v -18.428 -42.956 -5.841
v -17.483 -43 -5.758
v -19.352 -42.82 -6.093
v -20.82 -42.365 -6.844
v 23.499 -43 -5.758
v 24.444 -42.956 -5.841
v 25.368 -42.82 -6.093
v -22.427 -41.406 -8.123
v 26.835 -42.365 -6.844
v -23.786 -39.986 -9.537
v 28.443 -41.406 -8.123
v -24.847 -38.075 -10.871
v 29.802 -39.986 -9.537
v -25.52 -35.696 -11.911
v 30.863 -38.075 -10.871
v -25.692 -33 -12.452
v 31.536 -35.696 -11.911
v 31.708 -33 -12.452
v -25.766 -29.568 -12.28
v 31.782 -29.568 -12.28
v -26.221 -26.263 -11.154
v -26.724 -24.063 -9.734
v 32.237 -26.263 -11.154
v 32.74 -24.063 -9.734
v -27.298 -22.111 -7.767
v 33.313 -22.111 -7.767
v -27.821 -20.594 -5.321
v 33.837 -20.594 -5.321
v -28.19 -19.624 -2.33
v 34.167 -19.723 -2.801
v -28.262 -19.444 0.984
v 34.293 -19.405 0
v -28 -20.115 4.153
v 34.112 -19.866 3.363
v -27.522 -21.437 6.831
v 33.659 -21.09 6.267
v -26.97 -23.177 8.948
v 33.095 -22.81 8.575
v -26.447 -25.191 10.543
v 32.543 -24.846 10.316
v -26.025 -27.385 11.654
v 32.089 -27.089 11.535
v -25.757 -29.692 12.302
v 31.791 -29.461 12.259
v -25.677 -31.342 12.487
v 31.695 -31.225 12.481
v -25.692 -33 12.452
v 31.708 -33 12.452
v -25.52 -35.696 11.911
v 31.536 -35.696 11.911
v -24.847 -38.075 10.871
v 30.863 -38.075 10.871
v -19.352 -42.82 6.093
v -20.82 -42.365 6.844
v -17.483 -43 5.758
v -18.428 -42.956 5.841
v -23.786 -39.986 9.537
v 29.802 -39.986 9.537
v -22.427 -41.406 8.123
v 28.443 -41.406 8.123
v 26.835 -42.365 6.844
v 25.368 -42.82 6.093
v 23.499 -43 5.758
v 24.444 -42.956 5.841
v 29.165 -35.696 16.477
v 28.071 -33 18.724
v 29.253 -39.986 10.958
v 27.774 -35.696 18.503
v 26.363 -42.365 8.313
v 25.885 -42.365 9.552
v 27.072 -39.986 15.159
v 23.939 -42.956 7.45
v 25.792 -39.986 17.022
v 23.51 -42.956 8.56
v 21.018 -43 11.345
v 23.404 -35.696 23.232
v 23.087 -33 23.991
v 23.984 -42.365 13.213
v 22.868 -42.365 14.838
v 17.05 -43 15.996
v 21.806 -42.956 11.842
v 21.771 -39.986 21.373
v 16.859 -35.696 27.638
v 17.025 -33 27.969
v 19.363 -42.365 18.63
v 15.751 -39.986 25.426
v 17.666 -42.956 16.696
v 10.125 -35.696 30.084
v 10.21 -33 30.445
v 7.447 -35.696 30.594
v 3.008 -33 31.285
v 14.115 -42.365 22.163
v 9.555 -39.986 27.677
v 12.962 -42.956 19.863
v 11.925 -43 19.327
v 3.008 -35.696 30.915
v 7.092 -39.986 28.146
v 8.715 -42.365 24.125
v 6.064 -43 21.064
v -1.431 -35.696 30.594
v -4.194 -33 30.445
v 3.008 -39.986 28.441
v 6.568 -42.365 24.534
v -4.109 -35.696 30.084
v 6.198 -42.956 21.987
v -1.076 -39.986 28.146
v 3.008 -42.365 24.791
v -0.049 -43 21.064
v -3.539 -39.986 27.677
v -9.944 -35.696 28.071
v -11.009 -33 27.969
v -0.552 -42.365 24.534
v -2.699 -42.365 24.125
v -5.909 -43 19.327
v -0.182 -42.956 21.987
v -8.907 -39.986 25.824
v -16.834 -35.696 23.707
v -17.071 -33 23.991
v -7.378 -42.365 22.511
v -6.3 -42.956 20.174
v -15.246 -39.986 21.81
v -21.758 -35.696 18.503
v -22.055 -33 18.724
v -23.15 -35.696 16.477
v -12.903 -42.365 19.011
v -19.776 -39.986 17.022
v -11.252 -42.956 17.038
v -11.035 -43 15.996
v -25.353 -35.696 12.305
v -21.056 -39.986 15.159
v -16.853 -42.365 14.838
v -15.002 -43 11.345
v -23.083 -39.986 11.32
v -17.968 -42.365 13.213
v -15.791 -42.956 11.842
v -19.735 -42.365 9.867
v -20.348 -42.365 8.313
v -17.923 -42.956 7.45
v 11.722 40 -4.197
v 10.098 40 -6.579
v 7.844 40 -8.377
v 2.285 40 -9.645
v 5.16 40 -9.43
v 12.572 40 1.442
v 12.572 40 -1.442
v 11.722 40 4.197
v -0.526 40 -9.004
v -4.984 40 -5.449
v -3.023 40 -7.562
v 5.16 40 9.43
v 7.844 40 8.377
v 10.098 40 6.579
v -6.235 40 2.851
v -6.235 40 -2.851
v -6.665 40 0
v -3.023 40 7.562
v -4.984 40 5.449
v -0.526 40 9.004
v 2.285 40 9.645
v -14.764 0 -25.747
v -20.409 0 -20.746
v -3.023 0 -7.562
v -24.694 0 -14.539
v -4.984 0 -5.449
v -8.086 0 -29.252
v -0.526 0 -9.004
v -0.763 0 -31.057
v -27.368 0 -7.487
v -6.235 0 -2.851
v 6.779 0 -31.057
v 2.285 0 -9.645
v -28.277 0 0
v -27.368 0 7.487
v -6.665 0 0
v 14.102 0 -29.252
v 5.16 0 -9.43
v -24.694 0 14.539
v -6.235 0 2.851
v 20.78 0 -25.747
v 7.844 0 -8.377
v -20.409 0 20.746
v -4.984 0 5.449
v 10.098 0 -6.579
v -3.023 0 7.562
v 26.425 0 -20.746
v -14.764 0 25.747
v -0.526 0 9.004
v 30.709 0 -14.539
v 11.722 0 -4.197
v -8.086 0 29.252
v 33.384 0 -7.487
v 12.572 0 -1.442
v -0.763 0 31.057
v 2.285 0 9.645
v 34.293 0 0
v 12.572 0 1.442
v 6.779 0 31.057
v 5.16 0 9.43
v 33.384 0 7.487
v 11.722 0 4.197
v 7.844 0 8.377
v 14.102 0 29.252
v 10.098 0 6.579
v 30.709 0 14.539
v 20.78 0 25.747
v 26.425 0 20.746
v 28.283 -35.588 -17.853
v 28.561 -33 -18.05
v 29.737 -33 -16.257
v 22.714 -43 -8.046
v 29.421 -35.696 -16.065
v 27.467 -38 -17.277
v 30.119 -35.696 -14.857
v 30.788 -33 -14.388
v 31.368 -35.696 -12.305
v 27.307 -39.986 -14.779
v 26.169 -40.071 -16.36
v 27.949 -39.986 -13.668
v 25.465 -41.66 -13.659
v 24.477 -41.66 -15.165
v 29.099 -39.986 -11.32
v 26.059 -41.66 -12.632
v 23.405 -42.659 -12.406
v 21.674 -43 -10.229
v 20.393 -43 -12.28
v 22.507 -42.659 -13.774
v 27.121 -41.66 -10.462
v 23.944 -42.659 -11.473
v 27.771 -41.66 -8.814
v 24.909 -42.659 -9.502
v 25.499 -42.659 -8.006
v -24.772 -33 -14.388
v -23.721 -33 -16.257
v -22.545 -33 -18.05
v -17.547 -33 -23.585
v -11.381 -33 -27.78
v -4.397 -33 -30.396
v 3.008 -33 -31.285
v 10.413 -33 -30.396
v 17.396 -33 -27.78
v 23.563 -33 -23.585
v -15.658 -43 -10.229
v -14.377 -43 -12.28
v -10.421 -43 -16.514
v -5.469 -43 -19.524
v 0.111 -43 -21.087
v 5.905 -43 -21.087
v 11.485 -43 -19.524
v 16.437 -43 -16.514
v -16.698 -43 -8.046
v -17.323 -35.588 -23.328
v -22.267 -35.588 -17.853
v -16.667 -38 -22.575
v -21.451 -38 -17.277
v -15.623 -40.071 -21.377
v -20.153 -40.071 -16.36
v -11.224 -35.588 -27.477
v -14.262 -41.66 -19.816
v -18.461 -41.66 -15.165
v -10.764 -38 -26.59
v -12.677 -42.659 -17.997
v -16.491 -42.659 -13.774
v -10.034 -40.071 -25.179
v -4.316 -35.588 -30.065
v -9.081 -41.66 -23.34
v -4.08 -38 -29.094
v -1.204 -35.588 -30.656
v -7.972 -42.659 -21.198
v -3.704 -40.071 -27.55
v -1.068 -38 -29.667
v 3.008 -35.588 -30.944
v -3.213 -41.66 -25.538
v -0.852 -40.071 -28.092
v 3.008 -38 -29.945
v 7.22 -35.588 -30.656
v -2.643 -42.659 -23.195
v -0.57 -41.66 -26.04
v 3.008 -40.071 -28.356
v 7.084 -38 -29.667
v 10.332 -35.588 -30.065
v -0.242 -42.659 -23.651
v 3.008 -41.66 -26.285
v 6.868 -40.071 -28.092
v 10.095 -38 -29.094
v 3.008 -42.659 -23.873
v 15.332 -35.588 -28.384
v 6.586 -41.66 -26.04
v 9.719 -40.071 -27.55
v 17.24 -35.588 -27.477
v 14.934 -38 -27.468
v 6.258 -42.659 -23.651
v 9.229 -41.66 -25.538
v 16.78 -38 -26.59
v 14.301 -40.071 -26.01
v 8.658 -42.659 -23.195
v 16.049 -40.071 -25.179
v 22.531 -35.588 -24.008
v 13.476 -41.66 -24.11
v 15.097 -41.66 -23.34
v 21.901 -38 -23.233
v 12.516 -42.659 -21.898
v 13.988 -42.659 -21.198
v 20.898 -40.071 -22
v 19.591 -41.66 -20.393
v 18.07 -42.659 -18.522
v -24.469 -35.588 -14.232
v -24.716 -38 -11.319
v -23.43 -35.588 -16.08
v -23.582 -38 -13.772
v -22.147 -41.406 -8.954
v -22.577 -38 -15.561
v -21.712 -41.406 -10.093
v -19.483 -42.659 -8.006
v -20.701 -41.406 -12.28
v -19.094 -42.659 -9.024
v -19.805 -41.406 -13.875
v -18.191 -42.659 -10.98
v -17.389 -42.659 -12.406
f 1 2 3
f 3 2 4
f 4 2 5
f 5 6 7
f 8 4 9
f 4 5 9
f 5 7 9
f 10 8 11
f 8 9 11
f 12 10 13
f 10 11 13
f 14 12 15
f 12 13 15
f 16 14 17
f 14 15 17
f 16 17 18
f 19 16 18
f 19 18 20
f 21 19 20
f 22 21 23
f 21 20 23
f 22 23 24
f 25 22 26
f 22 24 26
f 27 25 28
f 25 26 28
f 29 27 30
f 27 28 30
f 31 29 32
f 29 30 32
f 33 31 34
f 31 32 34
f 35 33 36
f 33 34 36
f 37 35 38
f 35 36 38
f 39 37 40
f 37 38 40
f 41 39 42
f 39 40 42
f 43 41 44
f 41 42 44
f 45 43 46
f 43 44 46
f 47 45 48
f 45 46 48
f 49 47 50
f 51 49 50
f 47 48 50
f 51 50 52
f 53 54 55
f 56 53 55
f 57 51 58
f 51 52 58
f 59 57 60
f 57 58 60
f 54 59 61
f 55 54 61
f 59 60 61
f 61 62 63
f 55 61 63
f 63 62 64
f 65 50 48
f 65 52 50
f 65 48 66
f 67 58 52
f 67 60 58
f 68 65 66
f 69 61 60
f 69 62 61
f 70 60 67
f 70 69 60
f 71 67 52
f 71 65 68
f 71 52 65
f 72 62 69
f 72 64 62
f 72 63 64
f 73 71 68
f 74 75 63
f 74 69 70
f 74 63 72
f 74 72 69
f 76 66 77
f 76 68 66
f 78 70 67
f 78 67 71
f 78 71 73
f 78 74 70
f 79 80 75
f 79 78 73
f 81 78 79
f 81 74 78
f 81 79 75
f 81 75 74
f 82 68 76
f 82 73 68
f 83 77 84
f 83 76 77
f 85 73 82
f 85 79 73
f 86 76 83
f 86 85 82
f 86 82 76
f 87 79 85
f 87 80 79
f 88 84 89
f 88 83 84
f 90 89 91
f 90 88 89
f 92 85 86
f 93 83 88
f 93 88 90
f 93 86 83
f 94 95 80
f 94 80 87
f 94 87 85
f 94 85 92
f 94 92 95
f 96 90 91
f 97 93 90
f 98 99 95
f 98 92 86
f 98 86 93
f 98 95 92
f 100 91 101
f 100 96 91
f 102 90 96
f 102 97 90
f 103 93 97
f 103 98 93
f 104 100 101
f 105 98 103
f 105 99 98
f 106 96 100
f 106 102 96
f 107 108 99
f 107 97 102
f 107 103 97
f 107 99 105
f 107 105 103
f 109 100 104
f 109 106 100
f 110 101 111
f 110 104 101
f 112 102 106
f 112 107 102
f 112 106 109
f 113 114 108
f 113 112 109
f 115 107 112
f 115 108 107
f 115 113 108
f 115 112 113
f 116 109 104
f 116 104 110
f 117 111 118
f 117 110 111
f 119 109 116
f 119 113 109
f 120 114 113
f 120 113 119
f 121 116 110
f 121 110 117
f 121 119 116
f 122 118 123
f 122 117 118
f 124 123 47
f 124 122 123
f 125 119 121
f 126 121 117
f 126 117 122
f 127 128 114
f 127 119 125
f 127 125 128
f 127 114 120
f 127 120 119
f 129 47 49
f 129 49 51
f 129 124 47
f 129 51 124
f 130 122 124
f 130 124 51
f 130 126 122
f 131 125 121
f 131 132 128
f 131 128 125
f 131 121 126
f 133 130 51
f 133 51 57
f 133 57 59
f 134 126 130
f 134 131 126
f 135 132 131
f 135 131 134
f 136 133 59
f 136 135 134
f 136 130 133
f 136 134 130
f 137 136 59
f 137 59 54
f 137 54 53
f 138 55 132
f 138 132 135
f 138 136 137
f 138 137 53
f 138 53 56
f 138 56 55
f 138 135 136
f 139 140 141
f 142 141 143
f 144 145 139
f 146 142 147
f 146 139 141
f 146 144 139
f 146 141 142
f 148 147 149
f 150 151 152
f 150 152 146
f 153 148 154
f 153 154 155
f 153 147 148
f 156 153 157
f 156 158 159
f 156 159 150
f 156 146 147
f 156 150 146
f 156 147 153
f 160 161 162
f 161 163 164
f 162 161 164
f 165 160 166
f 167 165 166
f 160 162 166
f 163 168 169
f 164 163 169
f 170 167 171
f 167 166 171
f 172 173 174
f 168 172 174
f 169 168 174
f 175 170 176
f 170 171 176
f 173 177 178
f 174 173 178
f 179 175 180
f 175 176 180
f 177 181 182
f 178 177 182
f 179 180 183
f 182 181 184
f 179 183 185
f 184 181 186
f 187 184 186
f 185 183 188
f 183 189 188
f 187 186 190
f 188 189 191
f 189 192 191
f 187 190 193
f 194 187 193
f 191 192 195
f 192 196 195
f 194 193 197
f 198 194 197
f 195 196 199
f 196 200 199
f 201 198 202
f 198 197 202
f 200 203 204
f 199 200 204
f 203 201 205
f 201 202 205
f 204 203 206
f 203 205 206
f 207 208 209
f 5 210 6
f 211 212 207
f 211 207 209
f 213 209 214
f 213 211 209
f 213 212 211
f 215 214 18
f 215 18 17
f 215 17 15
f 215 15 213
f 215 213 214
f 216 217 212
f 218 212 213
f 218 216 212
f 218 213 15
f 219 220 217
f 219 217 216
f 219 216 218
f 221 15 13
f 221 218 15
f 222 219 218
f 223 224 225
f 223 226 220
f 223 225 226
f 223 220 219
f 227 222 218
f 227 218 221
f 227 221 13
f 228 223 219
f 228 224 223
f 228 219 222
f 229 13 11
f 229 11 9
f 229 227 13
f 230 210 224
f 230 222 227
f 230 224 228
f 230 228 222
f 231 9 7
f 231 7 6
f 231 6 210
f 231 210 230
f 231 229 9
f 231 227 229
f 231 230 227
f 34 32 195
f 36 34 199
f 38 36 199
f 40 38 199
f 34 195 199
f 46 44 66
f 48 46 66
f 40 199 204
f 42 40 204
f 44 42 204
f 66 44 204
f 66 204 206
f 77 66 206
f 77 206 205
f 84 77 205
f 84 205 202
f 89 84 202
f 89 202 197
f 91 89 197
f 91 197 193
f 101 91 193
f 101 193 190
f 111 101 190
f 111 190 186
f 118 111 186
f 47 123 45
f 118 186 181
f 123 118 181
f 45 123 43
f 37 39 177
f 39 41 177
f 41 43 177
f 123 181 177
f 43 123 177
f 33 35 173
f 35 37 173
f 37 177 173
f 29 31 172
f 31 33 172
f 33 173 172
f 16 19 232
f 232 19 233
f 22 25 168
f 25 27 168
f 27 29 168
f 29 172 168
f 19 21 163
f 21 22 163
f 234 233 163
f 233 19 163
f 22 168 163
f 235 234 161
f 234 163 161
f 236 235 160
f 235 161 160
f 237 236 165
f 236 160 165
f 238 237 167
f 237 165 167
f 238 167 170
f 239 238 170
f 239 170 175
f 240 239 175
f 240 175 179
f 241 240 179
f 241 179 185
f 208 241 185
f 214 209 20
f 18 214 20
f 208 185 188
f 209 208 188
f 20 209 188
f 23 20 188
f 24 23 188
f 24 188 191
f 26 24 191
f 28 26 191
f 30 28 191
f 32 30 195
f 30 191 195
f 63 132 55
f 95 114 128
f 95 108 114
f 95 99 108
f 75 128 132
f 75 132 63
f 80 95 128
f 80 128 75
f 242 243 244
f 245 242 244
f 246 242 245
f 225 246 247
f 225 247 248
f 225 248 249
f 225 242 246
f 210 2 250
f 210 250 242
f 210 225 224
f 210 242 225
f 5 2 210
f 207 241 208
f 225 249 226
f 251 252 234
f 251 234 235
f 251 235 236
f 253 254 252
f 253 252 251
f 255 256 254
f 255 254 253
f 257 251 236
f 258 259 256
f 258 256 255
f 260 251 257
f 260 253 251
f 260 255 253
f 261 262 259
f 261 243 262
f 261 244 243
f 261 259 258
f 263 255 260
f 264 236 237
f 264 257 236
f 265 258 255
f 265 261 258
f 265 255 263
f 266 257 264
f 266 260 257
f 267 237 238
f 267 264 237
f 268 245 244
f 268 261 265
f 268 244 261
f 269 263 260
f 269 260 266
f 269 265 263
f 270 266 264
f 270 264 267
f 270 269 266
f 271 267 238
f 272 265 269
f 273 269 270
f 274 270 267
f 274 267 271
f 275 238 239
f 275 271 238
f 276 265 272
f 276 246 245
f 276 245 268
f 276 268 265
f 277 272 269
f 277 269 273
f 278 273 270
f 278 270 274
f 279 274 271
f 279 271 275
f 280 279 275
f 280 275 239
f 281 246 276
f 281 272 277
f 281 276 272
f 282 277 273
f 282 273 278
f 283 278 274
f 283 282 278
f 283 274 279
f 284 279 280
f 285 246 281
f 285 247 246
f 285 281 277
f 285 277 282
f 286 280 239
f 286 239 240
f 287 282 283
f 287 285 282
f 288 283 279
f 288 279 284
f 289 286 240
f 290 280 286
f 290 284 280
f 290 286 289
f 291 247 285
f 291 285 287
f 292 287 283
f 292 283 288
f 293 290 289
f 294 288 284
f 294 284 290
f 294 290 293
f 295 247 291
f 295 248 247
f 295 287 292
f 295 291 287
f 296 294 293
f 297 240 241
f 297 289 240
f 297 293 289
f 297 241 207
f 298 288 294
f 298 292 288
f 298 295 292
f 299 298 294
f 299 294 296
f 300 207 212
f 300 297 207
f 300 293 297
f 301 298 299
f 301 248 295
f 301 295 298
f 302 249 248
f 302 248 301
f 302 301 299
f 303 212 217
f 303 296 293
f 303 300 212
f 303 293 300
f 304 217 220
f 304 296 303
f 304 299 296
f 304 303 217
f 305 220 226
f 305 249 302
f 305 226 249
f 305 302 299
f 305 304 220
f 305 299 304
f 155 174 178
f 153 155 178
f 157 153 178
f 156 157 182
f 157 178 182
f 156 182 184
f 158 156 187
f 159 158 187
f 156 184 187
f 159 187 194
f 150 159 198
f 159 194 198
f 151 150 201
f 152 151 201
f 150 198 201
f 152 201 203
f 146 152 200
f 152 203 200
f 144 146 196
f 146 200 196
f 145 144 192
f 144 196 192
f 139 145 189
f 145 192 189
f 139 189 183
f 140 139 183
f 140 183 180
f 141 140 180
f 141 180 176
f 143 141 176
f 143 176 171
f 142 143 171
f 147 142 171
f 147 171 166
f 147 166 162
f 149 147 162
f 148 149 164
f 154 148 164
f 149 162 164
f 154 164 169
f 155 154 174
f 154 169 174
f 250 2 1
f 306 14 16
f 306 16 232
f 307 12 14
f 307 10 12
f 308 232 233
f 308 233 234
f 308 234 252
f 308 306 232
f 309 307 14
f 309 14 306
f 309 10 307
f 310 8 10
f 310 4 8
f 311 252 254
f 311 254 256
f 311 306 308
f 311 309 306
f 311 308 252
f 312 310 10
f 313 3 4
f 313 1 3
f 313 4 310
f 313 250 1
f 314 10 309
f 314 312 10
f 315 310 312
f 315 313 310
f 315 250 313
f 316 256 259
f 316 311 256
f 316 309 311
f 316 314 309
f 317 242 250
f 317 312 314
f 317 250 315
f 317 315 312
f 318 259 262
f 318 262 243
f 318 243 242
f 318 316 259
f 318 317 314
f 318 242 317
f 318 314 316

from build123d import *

# Parameters (mm, degrees)
F0_R        = 31.2849976613
F1_DEPTH    = 43
F2_R        = 12.5
F3_DEPTH    = 40
F4_T3_ANGLE = 250.4726360275
F4_T6_ANGLE = 250.4726360275
F5_R        = 9.6724066991
F6_DEPTH    = 40


# Not quite as in the source:
# - a fillet or chamfer that OpenCascade refuses, or shapes differently, is made with other operations: its cross-section is extruded or revolved along the edge and cut away or added


with BuildPart() as f1:
    # F0 (on Front) → F1 (new body)
    with BuildSketch(Plane.XZ):
        with Locations((3.0078960117, 0)):
            Circle(F0_R)
    extrude(amount=F1_DEPTH)

    # F2 (on Right) → F3 (cut, symmetric)
    with BuildSketch(Plane.YZ):
        with Locations((-31.9053208832, 0)):
            Circle(F2_R)
    extrude(amount=F3_DEPTH, both=True, mode=Mode.SUBTRACT)

    # F4: fillet of radius 10 on 2 edges, made by hand


with BuildPart() as f4_tool1:
    # F4_s2 → F4_t3 (revolve)
    with BuildSketch(Plane(origin=(1.0012428292, 0, 1.4174438647), x_dir=(0, 1, 0), z_dir=(-0.5769501631, 0, -0.8167793517))):
        with BuildLine():
            ThreePointArc((-33, 33.7417850156), (-40.0710678119, 30.8128528275), (-43, 23.7417850156))
            Line((-43, 23.7417850156), (-43, 33.7417850156))
            Line((-43, 33.7417850156), (-33, 33.7417850156))
        make_face()
    revolve(axis=Axis((3.0078960117, -43, 0), (0, -1, 0)), revolution_arc=F4_T3_ANGLE)


with BuildPart() as f4_tool4:
    # F4_s5 → F4_t6 (revolve)
    with BuildSketch(Plane(origin=(1.0012428292, 0, 1.4174438647), x_dir=(0, 1, 0), z_dir=(0.5769501631, 0, 0.8167793517))):
        with BuildLine():
            ThreePointArc((-33, 28.828210307), (-40.0710678119, 25.8992781188), (-43, 18.828210307))
            Line((-43, 18.828210307), (-43, 28.828210307))
            Line((-43, 28.828210307), (-33, 28.828210307))
        make_face()
    revolve(axis=Axis((3.0078960117, -43, 0), (0, -1, 0)), revolution_arc=F4_T6_ANGLE)


with BuildPart() as f1_1:
    add(f1.part)

    # F4_t7: cut F4_tool1, F4_tool4
    add([f4_tool1.part, f4_tool4.part], mode=Mode.SUBTRACT)

    # F5 (on face) → F6 (join)
    with BuildSketch(Plane(origin=(0, 0, 0), x_dir=(-1, 0, 0), z_dir=(0, 1, 0))):
        with Locations((-3.0078960117, 0)):
            Circle(F5_R)
    extrude(amount=F6_DEPTH)


solid = f1_1.part
